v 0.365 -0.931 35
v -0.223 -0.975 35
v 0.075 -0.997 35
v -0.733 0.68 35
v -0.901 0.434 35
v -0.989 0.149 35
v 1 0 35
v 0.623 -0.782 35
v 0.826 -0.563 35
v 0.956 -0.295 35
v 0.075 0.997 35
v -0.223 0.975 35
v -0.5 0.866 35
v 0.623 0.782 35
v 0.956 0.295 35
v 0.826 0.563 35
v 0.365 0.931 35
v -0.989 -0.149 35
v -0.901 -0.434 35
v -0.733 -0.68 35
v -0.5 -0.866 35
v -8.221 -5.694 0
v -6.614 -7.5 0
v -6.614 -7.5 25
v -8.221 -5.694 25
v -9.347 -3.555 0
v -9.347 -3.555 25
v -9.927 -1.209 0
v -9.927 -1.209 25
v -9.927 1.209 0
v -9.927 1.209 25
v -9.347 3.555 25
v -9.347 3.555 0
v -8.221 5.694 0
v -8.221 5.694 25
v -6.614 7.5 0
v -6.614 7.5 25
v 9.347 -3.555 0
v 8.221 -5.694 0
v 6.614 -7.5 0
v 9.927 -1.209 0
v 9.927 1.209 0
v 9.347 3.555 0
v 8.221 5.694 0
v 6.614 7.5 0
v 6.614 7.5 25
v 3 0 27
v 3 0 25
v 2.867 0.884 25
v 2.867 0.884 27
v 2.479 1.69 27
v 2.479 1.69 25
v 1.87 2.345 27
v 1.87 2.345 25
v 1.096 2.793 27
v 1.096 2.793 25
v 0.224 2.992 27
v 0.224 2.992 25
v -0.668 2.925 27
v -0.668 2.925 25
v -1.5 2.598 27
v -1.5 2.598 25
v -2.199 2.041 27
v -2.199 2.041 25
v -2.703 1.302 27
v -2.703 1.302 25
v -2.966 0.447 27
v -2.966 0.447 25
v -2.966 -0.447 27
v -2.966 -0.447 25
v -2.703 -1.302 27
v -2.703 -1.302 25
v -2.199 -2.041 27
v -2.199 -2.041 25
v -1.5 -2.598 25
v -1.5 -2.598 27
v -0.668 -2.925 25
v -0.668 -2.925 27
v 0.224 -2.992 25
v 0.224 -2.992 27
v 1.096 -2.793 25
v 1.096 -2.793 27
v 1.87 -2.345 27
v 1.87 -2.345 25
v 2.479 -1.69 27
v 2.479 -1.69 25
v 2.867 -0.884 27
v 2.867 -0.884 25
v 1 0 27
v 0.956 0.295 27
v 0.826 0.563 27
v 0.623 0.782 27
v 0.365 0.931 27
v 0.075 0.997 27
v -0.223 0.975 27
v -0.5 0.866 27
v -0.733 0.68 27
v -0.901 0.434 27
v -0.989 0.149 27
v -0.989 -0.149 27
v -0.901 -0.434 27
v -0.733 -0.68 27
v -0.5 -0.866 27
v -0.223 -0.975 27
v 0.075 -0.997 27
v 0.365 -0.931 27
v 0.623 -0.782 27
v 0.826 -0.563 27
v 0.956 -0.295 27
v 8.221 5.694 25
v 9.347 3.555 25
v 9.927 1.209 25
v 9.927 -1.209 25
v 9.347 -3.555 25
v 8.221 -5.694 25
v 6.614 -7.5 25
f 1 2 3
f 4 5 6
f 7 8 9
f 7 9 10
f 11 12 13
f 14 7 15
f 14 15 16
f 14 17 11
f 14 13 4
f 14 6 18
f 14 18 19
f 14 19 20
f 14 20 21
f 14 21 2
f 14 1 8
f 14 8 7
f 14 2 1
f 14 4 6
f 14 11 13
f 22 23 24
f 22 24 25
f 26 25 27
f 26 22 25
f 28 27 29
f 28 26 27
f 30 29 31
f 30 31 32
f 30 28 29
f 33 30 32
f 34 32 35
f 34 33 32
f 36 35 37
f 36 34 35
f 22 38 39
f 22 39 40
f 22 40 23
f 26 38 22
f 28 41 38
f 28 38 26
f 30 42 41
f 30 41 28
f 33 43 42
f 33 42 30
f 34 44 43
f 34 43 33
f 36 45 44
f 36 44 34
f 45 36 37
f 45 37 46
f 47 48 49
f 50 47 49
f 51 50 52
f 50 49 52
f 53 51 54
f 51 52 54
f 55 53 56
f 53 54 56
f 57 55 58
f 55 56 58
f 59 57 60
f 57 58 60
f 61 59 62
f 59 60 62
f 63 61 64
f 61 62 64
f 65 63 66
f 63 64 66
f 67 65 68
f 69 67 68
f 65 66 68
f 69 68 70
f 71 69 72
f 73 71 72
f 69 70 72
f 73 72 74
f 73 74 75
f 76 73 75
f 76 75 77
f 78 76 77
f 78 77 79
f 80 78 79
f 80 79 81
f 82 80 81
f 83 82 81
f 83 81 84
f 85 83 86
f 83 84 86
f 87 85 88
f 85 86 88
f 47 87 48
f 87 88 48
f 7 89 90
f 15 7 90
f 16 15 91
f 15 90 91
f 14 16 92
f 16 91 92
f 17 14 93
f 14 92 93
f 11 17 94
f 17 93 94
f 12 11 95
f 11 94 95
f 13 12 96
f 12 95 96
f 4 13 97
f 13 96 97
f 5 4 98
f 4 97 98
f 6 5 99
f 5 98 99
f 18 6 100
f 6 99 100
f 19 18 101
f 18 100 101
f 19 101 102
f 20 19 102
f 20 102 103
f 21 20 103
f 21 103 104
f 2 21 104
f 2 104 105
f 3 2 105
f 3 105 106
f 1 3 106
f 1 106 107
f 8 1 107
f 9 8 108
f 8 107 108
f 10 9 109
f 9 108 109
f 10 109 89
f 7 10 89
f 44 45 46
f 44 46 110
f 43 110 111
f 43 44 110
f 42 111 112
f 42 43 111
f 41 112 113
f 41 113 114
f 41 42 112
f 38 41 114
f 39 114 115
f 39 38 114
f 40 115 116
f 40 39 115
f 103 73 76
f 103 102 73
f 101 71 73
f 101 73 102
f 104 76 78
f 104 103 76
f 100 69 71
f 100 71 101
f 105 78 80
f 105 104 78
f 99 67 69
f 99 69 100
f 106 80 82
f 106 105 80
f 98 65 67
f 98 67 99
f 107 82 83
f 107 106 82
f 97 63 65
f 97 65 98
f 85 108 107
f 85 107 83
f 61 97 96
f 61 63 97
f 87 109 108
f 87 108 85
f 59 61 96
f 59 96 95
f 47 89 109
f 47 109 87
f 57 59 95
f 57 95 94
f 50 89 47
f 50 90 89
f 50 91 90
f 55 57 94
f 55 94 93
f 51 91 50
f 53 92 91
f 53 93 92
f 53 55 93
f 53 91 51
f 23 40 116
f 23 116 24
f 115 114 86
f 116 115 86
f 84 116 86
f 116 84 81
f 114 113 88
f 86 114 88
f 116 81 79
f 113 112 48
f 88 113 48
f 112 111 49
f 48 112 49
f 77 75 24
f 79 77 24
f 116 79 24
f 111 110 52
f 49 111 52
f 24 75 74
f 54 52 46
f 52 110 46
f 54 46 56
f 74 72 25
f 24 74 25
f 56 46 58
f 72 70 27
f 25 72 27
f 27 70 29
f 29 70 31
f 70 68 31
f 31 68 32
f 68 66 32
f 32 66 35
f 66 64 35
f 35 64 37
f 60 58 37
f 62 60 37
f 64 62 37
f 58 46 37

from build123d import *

# Parameters (mm, degrees)
BOSS_EXTRU_1_DEPTH = 25
ESQUISSE2_R        = 3
BOSS_EXTRU_2_DEPTH = 2
ESQUISSE3_R        = 1
BOSS_EXTRU_3_DEPTH = 8


with BuildPart() as part:
    # Esquisse1 → Boss.-Extru.1 (new body)
    with BuildSketch(Plane.XY):
        with BuildLine():
            Line((-6.614378278, 7.5), (6.614378278, 7.5))
            ThreePointArc((6.614378278, 7.5), (10, 0), (6.614378278, -7.5))
            Line((6.614378278, -7.5), (-6.614378278, -7.5))
            ThreePointArc((-6.614378278, -7.5), (-10, 0), (-6.614378278, 7.5))
        make_face()
    extrude(amount=BOSS_EXTRU_1_DEPTH)

    # Esquisse2 → Boss.-Extru.2 (add)
    with BuildSketch(Plane.XY.offset(25)):
        Circle(ESQUISSE2_R)
    extrude(amount=BOSS_EXTRU_2_DEPTH)

    # Esquisse3 → Boss.-Extru.3 (add)
    with BuildSketch(Plane.XY.offset(27)):
        Circle(ESQUISSE3_R)
    extrude(amount=BOSS_EXTRU_3_DEPTH)


solid = part.part
